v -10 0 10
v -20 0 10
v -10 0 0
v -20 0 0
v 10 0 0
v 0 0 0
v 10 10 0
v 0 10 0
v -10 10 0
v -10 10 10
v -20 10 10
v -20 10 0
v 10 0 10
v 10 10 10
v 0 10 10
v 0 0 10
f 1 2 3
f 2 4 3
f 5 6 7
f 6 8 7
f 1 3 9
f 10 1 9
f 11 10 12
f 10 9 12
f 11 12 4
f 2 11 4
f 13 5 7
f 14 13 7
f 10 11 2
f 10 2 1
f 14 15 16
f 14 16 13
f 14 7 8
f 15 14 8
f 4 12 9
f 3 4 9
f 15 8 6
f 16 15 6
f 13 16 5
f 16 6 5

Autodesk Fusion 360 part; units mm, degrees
sketch "Sketch1" plane through (0, 0, 0) normal (0, 0, 1) x (1, 0, 0)
  line L0 (0, 0) -> (10, 0)
  line L1 (10, 0) -> (10, 10)
  line L2 (10, 10) -> (0, 10)
  line L3 (0, 10) -> (0, 0)
  line L4 (-10, 10) -> (-20, 10)
  line L5 (-20, 10) -> (-20, 0)
  line L6 (-20, 0) -> (-10, 0)
  line L7 (-10, 0) -> (-10, 10)
extrude "Extrude1" add sketch "Sketch1" along normal blind 10 contours L4 L5 L6 L7 makes body 1
extrude "Extrude1'" add sketch "Sketch1" along normal blind 10 separate body contours L0 L1 L2 L3 makes body 2 in component "Tool"
component "Tool" placed x (1, 0, 0) y (0, 1, 0) z (0, 0, 1) at (0, 0, 0)
